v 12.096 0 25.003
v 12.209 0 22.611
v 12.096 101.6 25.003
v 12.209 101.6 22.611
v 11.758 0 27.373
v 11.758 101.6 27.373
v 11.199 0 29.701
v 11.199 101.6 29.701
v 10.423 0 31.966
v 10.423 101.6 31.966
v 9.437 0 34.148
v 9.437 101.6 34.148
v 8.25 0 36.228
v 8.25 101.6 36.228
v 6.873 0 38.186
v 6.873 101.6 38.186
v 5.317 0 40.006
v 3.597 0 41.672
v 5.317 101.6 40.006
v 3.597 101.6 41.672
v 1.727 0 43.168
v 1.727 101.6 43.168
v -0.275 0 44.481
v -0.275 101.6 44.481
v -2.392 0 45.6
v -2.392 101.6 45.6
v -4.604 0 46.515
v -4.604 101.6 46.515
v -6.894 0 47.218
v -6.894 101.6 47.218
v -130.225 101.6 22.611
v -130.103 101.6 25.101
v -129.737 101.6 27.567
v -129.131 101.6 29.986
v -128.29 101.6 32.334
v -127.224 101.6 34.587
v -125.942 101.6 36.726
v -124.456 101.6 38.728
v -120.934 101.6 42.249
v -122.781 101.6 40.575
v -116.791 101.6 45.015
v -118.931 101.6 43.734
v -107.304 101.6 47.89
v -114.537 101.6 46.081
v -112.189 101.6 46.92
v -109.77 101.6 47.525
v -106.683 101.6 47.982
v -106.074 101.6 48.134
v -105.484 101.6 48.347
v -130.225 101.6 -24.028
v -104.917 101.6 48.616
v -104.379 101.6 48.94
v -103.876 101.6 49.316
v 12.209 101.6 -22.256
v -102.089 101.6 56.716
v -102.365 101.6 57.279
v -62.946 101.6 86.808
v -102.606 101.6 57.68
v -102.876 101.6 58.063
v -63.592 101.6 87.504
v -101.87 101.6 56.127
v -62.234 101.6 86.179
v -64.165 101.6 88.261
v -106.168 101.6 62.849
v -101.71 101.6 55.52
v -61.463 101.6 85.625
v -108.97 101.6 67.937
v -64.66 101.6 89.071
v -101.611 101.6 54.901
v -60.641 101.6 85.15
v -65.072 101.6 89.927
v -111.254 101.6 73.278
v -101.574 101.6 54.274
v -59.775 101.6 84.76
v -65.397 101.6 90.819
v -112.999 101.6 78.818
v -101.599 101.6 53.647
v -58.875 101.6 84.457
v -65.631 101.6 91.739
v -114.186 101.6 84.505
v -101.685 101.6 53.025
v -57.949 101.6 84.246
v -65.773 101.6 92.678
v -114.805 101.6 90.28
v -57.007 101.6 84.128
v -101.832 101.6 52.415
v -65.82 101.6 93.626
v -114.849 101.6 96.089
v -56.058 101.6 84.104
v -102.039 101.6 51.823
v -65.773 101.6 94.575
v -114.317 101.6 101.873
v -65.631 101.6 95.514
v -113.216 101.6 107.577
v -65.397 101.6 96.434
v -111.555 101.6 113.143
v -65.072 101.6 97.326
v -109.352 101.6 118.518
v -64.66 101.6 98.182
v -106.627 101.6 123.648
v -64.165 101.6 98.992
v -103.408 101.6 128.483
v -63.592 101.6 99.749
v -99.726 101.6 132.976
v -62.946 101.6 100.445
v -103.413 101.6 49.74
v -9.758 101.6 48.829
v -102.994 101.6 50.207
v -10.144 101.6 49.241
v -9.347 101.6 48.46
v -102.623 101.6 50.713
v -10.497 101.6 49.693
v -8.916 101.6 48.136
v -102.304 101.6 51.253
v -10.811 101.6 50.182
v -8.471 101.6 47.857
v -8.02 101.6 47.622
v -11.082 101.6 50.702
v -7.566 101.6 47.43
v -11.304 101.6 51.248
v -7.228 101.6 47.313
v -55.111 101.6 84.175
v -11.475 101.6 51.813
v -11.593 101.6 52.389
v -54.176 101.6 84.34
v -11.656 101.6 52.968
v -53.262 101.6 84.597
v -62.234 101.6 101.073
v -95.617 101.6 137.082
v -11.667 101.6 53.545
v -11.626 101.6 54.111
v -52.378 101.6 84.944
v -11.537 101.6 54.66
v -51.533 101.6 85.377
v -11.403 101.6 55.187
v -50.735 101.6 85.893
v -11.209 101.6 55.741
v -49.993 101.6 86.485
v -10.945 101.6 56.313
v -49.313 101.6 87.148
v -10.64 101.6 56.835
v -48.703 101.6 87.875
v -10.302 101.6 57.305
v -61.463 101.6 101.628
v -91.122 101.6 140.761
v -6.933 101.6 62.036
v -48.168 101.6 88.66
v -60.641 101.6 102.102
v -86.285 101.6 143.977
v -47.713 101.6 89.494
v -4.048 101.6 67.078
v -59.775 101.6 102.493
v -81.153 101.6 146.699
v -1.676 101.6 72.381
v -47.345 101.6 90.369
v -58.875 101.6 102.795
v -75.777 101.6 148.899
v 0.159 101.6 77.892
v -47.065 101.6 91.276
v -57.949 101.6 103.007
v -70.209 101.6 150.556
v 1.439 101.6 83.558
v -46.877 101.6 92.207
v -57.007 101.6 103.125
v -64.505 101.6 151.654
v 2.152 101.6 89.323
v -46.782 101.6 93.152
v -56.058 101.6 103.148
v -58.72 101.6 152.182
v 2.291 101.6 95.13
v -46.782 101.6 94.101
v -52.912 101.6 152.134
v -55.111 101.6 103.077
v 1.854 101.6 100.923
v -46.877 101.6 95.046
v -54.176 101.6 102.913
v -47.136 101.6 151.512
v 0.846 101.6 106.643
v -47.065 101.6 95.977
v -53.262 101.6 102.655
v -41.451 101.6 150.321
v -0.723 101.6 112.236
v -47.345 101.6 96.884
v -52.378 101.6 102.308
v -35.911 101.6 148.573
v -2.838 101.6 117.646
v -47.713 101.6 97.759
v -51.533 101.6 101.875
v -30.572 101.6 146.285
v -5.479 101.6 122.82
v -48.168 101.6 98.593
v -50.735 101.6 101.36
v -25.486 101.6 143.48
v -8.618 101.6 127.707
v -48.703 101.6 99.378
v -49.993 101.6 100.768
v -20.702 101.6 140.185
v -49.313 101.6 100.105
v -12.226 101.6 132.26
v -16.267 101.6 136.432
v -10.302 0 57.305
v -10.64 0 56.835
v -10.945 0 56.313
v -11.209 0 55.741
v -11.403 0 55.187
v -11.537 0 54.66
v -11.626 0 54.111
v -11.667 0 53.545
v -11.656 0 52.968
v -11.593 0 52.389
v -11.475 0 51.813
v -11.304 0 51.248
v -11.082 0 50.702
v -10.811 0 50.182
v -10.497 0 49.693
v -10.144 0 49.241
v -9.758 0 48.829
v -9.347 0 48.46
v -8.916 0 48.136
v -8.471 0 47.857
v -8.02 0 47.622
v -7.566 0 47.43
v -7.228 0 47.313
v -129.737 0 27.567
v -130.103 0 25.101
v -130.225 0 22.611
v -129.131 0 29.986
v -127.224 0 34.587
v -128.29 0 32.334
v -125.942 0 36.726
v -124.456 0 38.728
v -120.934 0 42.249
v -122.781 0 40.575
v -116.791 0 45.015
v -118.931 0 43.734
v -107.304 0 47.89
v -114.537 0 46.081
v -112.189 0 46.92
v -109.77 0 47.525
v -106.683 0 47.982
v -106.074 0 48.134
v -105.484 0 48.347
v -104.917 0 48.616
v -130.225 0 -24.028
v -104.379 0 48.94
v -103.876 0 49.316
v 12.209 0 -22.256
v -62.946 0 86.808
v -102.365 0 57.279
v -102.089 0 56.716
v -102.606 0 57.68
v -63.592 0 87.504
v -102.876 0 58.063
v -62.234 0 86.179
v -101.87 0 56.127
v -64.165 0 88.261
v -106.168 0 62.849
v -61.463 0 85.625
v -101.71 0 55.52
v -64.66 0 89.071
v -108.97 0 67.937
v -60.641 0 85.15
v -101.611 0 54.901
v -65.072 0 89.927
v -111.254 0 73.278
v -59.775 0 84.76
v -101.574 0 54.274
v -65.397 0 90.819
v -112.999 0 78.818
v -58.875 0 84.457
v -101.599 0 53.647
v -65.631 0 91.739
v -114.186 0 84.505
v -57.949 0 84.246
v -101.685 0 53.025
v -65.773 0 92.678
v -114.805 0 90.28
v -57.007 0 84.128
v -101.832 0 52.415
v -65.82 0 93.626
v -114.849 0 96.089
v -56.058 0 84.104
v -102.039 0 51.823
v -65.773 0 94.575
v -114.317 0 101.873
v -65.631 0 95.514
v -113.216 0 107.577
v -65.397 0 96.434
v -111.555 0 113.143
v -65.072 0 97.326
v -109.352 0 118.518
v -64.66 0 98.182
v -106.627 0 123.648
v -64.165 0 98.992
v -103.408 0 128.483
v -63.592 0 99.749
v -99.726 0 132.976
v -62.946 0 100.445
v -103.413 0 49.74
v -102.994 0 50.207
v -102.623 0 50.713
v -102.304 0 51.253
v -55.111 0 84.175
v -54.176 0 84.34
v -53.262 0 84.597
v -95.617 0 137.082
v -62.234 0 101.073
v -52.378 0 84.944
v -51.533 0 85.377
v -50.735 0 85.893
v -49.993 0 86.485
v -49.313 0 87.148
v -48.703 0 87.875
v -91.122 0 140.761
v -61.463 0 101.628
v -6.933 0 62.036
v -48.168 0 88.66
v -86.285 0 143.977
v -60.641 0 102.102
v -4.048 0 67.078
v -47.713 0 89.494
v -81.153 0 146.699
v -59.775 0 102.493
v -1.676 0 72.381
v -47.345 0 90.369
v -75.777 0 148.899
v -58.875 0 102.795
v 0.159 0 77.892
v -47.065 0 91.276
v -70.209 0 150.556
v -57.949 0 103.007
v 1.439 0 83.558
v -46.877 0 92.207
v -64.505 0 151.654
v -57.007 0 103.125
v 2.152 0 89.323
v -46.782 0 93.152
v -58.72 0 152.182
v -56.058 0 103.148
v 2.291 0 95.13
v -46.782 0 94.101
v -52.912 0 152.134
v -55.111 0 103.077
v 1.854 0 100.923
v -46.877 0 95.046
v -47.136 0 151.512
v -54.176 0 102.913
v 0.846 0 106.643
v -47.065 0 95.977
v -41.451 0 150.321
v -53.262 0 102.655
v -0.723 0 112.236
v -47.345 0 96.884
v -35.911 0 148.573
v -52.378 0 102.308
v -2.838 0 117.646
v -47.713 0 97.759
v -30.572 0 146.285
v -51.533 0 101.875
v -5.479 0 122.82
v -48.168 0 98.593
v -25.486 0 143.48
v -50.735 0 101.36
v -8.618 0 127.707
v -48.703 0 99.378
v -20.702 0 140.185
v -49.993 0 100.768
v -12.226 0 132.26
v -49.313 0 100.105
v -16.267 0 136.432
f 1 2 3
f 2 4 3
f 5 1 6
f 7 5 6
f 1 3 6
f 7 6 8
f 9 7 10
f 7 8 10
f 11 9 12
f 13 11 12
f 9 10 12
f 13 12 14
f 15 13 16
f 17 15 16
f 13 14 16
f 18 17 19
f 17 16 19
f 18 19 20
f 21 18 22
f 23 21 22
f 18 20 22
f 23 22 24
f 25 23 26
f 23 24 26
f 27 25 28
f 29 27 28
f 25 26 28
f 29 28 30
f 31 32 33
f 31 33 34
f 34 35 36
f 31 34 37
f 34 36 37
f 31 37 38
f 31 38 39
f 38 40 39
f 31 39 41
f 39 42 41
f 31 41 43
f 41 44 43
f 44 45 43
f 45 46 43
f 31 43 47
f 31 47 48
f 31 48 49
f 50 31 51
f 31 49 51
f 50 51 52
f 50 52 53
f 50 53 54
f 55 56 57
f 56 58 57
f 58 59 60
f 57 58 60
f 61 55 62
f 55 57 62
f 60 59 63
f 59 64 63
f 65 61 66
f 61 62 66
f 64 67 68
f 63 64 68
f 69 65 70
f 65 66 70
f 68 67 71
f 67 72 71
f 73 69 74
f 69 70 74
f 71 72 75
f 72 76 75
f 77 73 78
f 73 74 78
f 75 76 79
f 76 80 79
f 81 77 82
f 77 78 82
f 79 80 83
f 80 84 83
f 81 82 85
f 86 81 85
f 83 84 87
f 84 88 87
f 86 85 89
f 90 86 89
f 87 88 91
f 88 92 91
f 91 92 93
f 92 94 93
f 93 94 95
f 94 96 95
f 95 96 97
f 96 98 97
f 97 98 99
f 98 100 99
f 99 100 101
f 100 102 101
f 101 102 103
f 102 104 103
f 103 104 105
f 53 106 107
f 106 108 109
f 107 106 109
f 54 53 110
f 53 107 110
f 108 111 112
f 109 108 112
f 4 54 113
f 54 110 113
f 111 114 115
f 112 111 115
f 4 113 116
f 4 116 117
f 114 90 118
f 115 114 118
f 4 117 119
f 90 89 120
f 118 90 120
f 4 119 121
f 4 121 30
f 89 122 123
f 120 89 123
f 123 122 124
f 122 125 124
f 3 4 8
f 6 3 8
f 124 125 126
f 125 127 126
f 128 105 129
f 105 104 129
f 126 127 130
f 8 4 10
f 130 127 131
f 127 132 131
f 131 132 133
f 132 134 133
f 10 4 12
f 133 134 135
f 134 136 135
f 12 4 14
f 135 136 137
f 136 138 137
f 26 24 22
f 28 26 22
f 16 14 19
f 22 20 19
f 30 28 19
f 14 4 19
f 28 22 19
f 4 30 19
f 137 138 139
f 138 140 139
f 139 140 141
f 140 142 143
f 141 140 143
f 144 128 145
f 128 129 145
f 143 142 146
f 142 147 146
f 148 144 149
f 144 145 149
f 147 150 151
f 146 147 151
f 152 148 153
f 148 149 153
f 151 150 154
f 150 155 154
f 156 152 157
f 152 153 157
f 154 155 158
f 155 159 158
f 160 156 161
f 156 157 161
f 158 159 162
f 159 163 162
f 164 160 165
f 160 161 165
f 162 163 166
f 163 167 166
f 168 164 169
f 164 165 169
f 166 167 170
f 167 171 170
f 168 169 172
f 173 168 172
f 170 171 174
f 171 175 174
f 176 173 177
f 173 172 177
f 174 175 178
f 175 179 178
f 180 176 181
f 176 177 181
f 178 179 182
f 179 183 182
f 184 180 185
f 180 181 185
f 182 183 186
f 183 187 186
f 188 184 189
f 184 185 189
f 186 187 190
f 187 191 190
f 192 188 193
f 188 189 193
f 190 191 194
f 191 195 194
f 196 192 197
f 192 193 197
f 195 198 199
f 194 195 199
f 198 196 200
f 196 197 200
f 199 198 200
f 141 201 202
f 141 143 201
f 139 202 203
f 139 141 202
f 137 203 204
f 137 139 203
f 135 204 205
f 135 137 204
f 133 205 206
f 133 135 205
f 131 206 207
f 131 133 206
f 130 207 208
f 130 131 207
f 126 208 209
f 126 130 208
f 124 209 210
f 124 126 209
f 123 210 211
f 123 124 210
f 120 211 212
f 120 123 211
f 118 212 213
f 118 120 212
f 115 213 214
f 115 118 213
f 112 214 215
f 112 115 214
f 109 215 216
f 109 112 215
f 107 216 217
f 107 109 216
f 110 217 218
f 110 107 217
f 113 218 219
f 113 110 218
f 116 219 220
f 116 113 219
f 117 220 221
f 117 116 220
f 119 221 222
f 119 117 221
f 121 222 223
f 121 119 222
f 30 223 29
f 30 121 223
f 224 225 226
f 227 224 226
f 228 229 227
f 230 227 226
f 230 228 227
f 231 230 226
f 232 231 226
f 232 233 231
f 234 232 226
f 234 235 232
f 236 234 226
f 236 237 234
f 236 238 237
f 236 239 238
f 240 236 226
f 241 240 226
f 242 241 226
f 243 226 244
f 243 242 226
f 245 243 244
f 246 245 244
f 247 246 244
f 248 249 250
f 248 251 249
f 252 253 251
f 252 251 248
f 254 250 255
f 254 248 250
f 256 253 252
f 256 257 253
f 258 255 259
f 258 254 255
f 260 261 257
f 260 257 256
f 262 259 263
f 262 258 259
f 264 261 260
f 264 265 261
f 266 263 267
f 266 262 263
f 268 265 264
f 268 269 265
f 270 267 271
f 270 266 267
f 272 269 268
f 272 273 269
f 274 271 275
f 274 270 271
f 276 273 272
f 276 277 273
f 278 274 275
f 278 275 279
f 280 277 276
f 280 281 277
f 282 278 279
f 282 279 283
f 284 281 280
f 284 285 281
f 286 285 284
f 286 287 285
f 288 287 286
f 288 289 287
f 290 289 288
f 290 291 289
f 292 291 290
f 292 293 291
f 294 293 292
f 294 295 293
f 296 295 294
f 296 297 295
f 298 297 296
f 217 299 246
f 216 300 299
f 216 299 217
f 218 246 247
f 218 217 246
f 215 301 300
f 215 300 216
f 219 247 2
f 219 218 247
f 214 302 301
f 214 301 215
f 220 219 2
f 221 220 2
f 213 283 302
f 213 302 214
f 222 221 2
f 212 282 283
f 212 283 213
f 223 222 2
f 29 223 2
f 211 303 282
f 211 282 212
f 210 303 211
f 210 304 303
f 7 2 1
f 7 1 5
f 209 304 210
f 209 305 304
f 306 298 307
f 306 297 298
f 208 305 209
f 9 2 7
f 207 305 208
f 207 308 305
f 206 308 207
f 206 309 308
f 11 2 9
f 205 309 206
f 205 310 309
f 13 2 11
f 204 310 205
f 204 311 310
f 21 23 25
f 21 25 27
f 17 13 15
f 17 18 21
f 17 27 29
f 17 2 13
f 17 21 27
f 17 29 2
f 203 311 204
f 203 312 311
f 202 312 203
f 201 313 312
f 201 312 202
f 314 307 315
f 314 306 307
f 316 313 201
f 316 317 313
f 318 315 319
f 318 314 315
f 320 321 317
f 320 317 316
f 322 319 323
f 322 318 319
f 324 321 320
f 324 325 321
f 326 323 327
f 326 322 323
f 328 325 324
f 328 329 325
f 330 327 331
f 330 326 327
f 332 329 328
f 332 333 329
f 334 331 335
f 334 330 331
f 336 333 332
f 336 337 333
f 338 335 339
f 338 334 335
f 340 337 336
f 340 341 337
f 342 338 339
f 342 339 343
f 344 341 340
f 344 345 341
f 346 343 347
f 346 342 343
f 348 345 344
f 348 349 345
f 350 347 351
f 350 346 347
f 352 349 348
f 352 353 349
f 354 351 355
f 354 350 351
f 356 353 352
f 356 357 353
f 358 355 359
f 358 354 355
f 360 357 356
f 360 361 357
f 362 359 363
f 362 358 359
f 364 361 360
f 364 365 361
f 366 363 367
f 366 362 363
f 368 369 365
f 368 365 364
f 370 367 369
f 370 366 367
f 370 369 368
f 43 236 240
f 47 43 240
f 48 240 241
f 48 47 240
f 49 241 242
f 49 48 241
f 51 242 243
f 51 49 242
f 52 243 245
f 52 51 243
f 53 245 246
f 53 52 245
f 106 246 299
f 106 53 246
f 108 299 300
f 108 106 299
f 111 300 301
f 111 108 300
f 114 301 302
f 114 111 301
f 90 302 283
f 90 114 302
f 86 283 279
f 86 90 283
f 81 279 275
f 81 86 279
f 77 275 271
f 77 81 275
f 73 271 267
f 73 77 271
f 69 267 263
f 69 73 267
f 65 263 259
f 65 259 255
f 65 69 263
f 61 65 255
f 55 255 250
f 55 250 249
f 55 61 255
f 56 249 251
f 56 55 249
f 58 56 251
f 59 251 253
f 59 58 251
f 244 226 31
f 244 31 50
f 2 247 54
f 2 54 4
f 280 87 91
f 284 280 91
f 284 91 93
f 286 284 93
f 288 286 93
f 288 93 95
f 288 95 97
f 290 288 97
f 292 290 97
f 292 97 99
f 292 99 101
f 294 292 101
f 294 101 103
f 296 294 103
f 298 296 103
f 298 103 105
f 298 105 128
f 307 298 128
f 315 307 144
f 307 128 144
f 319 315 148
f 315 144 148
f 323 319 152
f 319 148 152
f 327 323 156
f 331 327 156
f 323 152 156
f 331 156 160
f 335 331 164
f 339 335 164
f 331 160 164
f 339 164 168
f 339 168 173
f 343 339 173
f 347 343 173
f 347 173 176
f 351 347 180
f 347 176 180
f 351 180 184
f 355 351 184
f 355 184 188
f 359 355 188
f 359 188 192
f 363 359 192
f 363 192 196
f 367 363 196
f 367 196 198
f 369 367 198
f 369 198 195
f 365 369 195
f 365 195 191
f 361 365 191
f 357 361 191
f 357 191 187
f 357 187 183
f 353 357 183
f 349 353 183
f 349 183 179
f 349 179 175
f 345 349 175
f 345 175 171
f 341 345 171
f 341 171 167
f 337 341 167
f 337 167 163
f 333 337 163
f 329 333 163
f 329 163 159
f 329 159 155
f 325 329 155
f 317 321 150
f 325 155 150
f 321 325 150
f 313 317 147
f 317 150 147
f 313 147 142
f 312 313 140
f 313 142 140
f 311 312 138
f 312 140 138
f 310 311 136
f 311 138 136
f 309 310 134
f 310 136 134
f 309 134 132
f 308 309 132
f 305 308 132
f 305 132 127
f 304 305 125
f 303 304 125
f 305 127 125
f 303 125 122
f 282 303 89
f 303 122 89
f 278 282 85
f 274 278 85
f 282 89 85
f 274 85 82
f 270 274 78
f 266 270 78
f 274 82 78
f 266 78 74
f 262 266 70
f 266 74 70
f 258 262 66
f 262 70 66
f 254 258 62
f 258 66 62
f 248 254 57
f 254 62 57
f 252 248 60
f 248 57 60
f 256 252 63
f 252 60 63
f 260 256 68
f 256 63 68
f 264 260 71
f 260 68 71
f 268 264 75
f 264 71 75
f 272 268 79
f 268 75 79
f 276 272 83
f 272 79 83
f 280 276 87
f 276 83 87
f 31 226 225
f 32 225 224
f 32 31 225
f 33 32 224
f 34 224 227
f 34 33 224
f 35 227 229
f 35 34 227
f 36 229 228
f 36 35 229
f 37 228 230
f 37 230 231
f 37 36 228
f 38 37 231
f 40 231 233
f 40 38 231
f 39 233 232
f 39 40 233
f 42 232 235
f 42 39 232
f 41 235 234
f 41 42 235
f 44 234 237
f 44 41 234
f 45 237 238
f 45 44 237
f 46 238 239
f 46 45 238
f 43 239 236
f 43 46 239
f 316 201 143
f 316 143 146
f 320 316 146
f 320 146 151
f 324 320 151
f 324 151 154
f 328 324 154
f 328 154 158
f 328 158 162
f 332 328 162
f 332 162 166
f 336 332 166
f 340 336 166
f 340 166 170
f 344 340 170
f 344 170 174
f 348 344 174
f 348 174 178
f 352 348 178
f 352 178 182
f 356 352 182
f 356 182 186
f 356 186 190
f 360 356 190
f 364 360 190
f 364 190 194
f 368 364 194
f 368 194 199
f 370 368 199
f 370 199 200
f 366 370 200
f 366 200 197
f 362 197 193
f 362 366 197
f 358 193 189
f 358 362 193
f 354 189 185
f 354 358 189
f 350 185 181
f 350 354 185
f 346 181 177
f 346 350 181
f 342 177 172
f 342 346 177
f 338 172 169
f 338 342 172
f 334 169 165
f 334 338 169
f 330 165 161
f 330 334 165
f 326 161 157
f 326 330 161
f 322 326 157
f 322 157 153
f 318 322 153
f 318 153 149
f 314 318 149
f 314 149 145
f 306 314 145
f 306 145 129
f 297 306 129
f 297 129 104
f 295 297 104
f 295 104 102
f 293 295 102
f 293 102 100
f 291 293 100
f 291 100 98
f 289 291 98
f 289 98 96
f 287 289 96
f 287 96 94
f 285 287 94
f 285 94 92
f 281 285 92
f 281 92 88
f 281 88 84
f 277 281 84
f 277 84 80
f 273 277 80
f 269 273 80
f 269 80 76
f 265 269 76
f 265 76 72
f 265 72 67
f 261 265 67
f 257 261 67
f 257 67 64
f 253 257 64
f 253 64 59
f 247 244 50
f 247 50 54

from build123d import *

# Parameters (mm, degrees)
F1_DEPTH = 101.6
F3_D     = 19.05
F4_R     = 25.4
F5_R     = 6.35


with BuildPart() as f1:
    # F0 (on Front) → F1 (new body)
    with BuildSketch(Plane.XZ):
        with BuildLine():
            Line((-130.225047, 48.010781), (-130.225047, -24.027621))
            Line((-130.225047, -24.027621), (12.208596, -22.256413))
            Line((12.208596, -22.256413), (12.208596, 48.010781))
            Line((12.208596, 48.010781), (-19.5011, 48.010781))
            ThreePointArc((-19.5011, 48.010781), (-56.295205, 152.231707), (-93.08931, 48.010781))
            Line((-93.08931, 48.010781), (-130.225047, 48.010781))
        make_face()
    extrude(amount=-F1_DEPTH)

    # F3 (through all)
    with Locations(Plane.XZ):
        with Locations((-56.295205, 93.626358)):
            Hole(F3_D / 2)

    # F4
    f4_edges = [f1.edges().sort_by_distance(p)[0] for p in [
        (-130.225047, 50.8, 48.010781),
        (12.208596, 50.8, 48.010781),
    ]]
    fillet(f4_edges, radius=F4_R)

    # F5
    f5_edges = [f1.edges().sort_by_distance(p)[0] for p in [
        (-19.5011, 50.8, 48.010781),
        (-93.08931, 50.8, 48.010781),
    ]]
    fillet(f5_edges, radius=F5_R)


solid = f1.part
